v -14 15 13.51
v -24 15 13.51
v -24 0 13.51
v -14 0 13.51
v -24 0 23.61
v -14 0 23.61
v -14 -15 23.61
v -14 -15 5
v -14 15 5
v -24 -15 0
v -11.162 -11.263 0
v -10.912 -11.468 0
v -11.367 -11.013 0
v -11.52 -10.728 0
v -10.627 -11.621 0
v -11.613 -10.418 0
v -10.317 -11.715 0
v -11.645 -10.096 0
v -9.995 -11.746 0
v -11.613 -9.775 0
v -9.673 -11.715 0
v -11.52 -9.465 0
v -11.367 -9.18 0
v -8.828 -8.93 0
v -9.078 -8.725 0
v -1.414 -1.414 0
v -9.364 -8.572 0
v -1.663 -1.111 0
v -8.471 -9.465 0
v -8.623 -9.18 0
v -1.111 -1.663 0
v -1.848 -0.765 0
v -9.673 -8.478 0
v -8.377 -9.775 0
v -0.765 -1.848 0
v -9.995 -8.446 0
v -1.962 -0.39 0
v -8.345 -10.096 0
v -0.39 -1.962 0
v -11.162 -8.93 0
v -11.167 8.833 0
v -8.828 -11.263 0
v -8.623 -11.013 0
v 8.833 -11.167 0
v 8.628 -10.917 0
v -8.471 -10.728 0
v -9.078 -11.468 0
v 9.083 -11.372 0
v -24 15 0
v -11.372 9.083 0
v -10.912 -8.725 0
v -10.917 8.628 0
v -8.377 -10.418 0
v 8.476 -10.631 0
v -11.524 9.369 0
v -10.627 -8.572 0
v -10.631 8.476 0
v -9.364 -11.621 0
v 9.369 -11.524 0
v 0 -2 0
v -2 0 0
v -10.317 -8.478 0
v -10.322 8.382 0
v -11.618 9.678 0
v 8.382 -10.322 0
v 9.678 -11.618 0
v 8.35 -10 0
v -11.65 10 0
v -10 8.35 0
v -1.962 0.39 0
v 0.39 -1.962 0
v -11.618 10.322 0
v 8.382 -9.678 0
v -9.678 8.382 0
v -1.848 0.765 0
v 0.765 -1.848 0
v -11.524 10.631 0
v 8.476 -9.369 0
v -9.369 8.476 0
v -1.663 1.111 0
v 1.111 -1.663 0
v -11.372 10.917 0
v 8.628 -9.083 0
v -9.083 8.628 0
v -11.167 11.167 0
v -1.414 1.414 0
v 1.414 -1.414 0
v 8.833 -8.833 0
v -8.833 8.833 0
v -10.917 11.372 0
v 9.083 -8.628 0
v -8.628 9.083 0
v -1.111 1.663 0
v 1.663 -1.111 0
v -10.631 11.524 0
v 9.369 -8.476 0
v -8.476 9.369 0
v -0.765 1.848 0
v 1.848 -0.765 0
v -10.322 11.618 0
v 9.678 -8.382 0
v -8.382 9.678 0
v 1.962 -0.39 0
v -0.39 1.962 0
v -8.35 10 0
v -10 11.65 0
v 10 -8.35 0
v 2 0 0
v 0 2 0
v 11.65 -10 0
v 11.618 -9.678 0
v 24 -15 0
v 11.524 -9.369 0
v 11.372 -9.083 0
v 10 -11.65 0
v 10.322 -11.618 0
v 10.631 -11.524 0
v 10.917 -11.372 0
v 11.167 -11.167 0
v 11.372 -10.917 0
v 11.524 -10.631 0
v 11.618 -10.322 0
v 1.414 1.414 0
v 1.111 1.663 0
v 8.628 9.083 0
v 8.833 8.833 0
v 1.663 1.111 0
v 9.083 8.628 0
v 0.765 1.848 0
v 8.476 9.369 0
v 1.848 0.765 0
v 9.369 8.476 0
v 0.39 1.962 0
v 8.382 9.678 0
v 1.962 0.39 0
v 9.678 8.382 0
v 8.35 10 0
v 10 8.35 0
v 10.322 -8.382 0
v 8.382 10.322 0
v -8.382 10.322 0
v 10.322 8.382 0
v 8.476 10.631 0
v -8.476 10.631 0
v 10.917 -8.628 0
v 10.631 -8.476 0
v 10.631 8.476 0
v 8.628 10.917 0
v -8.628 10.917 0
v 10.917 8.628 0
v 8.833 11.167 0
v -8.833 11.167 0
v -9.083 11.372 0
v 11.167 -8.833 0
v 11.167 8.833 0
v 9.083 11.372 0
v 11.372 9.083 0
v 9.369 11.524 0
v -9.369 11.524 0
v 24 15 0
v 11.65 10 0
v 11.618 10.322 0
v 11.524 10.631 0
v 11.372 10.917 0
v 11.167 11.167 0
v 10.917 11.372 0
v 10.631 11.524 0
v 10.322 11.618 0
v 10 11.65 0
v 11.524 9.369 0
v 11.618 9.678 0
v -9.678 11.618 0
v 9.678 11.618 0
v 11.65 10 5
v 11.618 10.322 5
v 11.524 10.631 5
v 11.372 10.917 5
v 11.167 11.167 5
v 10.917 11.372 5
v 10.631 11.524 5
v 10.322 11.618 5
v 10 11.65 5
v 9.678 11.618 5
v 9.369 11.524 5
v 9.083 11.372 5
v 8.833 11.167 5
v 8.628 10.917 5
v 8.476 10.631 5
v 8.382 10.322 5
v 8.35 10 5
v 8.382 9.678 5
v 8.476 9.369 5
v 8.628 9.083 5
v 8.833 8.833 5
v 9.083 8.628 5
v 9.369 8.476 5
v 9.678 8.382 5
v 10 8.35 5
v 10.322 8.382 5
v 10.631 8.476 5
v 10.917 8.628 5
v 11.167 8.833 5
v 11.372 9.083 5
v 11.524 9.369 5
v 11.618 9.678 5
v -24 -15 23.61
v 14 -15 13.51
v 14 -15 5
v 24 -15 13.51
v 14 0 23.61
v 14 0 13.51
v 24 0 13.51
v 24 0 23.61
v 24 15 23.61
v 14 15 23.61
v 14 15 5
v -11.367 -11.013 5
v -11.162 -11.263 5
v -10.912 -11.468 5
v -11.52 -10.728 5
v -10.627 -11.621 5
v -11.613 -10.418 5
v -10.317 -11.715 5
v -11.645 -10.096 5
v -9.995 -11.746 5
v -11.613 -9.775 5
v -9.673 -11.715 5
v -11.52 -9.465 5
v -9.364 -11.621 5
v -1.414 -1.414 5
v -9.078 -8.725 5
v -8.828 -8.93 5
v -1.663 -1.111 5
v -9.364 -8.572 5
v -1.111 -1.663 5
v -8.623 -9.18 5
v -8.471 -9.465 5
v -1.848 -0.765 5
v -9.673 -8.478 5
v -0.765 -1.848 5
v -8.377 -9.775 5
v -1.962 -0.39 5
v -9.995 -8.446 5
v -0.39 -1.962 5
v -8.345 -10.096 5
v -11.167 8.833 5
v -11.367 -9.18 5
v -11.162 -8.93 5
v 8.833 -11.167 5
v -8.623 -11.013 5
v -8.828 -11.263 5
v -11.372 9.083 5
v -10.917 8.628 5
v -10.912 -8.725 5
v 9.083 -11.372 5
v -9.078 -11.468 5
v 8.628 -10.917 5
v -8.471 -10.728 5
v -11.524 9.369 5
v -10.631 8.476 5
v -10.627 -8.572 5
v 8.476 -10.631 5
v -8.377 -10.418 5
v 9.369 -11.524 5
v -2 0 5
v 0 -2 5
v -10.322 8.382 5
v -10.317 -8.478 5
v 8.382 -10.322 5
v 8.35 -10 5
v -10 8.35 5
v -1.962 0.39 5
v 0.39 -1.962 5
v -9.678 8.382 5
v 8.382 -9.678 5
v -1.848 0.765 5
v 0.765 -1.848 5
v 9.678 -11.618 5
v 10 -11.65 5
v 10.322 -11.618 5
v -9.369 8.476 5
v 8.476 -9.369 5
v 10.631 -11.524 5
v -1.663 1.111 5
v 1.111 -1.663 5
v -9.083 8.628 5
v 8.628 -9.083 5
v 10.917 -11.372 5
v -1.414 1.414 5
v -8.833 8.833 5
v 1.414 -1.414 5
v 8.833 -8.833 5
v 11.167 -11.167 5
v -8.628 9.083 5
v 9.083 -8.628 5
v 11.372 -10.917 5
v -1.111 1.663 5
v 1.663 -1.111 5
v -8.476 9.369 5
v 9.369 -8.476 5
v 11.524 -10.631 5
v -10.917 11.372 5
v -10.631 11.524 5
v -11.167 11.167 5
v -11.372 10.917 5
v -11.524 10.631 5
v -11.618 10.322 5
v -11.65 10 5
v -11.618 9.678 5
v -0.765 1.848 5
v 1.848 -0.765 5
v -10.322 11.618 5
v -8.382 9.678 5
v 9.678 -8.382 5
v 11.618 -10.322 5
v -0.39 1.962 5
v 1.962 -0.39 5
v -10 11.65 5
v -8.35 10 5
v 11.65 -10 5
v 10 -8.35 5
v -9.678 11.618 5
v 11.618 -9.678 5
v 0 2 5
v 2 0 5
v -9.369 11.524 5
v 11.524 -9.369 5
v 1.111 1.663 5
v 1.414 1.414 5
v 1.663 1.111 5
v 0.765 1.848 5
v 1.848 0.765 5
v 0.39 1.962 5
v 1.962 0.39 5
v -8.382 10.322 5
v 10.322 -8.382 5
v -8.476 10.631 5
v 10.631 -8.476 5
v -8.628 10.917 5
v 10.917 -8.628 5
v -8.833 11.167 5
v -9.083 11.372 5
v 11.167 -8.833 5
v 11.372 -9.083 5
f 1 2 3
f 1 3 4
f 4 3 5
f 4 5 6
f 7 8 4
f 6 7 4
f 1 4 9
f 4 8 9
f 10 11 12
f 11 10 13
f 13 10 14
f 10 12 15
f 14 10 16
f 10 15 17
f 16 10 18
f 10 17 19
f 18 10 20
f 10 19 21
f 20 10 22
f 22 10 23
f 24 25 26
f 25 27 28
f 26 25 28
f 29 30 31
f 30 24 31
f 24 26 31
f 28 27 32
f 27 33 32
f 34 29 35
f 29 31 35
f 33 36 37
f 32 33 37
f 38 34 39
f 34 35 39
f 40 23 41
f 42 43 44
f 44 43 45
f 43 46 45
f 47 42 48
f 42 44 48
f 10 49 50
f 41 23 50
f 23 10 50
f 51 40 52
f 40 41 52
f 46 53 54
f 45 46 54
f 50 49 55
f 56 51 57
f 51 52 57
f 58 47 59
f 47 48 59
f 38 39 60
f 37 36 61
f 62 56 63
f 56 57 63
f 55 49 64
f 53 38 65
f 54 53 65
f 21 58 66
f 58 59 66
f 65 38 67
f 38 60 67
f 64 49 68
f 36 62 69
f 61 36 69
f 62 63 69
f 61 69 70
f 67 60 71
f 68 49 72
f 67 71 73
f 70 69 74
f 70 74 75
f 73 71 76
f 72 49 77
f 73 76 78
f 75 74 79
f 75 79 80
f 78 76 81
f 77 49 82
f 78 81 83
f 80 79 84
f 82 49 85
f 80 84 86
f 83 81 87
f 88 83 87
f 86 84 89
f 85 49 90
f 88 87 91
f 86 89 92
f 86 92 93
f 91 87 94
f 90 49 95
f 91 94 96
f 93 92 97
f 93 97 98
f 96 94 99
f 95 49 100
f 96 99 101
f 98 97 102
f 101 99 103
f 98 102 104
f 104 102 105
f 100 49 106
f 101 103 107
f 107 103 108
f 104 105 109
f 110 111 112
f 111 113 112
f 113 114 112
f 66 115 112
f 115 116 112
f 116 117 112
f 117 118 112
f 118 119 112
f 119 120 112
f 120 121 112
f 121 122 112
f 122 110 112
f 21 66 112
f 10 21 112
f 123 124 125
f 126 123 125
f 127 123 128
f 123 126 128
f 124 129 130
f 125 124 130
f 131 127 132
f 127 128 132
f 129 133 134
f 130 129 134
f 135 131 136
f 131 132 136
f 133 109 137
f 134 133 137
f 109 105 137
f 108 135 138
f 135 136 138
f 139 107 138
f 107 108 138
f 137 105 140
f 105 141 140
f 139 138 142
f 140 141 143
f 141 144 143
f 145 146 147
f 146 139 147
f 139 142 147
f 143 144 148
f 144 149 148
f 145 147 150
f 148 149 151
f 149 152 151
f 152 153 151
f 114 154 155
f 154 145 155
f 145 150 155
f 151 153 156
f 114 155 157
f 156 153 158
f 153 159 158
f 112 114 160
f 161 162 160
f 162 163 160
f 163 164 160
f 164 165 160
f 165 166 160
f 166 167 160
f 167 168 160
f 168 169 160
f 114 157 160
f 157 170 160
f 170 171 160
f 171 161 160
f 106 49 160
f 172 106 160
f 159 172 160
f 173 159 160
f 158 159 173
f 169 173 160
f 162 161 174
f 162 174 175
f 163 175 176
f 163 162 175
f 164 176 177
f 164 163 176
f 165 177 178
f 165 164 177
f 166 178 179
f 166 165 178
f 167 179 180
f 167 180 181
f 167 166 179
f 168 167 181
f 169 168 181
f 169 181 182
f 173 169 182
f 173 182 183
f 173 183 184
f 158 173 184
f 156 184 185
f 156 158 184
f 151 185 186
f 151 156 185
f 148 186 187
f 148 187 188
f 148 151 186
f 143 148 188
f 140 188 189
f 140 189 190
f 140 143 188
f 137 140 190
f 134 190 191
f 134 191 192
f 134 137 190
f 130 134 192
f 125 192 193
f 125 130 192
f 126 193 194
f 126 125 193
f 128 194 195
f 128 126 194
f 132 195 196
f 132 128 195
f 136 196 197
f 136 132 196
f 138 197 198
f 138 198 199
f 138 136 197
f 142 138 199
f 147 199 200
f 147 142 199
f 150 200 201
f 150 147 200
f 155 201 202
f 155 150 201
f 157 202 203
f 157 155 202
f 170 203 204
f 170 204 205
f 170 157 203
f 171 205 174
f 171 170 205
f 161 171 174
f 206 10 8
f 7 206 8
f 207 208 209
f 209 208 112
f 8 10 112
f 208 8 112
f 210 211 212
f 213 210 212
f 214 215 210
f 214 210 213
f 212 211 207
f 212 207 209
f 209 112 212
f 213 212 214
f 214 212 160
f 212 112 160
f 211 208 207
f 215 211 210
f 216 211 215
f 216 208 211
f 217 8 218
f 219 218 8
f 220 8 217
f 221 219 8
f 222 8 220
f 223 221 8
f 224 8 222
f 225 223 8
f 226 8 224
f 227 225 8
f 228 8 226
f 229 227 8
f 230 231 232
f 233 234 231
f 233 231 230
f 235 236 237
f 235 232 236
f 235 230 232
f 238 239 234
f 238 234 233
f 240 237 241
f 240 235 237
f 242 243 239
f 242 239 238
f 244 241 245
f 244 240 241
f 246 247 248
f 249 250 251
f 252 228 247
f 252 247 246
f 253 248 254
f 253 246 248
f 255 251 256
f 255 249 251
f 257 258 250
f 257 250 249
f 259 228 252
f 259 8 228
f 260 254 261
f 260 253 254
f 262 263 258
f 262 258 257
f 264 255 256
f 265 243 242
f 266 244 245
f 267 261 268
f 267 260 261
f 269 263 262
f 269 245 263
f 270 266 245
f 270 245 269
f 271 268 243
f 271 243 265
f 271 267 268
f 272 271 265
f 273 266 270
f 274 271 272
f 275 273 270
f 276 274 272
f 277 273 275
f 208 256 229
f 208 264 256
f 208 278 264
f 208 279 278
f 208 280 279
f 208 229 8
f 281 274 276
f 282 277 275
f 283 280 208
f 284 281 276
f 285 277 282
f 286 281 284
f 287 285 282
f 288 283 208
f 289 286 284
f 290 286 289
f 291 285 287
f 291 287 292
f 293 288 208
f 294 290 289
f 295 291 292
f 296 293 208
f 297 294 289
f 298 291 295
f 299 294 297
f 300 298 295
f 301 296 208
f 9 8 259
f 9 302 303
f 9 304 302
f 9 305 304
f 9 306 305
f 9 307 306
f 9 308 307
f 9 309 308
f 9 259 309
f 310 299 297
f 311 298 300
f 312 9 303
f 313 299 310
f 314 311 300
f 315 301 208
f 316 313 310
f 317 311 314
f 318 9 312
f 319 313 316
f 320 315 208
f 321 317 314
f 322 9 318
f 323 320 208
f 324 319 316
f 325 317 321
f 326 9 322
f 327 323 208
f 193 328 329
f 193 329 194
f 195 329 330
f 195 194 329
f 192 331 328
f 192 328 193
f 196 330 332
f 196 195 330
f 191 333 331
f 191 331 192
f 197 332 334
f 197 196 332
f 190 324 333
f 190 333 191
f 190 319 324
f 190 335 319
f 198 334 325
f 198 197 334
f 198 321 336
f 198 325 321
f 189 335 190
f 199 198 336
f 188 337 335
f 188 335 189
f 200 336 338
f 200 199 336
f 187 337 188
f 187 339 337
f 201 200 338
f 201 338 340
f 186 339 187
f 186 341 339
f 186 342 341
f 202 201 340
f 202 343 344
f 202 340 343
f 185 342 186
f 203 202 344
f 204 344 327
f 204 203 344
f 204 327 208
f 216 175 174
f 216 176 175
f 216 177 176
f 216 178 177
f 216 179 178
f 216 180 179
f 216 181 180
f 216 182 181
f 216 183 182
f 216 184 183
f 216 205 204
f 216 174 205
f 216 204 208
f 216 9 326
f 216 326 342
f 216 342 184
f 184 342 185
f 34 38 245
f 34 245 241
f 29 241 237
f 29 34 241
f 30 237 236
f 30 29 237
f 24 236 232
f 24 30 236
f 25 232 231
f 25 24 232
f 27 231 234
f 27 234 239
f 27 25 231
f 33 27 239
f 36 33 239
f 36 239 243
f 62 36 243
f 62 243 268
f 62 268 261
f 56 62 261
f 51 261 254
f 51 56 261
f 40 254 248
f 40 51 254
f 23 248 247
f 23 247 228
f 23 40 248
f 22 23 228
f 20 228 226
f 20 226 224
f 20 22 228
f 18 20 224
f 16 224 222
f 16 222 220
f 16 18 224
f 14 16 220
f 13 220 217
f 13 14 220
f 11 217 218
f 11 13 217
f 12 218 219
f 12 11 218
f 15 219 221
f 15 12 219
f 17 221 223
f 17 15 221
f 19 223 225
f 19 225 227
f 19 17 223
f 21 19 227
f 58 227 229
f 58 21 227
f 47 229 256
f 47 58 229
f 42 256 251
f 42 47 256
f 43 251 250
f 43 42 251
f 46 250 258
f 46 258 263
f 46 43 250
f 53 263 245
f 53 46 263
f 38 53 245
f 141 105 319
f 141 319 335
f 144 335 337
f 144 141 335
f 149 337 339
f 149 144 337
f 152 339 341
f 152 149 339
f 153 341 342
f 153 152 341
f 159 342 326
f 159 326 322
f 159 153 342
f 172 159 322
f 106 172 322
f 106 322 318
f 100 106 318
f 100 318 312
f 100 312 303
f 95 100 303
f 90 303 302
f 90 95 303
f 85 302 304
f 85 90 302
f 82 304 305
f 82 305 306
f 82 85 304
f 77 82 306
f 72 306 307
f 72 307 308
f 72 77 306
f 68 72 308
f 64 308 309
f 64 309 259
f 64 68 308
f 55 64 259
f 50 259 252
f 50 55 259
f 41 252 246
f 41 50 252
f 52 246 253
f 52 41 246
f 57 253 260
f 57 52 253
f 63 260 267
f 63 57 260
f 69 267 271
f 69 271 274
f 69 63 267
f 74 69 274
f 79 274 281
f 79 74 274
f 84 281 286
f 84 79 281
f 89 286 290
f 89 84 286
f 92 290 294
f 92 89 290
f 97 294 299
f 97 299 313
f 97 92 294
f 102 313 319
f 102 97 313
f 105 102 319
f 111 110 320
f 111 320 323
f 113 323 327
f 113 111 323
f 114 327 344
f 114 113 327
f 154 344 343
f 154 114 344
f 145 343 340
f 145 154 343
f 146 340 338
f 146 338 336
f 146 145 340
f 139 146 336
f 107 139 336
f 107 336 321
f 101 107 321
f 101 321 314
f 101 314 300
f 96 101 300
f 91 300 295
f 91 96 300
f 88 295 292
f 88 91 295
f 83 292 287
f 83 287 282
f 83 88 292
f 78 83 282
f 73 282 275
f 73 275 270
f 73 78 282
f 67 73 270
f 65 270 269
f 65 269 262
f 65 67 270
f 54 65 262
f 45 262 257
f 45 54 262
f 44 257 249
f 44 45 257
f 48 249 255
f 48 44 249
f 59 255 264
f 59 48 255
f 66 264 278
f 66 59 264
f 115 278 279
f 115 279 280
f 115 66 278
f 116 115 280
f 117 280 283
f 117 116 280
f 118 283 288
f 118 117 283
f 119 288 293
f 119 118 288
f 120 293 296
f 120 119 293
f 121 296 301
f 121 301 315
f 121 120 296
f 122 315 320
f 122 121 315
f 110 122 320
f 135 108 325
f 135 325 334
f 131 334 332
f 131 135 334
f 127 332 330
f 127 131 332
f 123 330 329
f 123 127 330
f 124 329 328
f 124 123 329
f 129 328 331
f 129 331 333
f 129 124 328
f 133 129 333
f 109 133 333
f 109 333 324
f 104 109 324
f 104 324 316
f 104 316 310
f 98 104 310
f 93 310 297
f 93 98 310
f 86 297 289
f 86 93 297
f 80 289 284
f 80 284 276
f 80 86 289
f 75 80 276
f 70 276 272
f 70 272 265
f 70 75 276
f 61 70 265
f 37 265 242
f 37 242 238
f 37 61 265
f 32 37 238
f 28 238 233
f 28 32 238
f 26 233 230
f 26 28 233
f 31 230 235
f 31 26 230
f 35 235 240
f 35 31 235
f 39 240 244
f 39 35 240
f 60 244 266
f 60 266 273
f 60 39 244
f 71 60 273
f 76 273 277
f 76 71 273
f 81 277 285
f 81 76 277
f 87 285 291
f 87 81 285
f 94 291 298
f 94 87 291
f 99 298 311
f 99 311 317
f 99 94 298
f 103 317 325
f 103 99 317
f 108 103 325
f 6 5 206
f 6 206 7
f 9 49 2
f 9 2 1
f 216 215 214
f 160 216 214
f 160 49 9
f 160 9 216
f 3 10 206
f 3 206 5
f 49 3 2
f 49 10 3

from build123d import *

# Parameters (mm, degrees)
SKETCH1_W           = 48
SKETCH1_H           = 30
SKETCH1_R           = 1.65
SKETCH1_R_2         = 2
BOSS_EXTRUDE1_DEPTH = 5
SKETCH2_W           = 10
SKETCH2_H           = 15
BOSS_EXTRUDE2_DEPTH = 18.61
SKETCH2_3_W         = 10
SKETCH2_3_H         = 15
BOSS_EXTRUDE3_DEPTH = 8.51


with BuildPart() as part:
    # Sketch1 → Boss-Extrude1 (new body)
    with BuildSketch(Plane.XY):
        Rectangle(SKETCH1_W, SKETCH1_H)
        with Locations((-10, 10)):
            Circle(SKETCH1_R, mode=Mode.SUBTRACT)
        with Locations((10, 10)):
            Circle(SKETCH1_R, mode=Mode.SUBTRACT)
        with Locations((10, -10)):
            Circle(SKETCH1_R, mode=Mode.SUBTRACT)
        with Locations((-9.995165444, -10.096450463)):
            Circle(SKETCH1_R, mode=Mode.SUBTRACT)
        Circle(SKETCH1_R_2, mode=Mode.SUBTRACT)
    extrude(amount=BOSS_EXTRUDE1_DEPTH)

    # Sketch2 → Boss-Extrude2 (add)
    with BuildSketch(Plane.XY.offset(5)):
        with Locations((19, 7.5)):
            Rectangle(SKETCH2_W, SKETCH2_H)
        with Locations((-19, -7.5)):
            Rectangle(SKETCH2_W, SKETCH2_H)
    extrude(amount=BOSS_EXTRUDE2_DEPTH)

    # Sketch2<3> → Boss-Extrude3 (add)
    with BuildSketch(Plane.XY.offset(5)):
        with Locations((19, -7.5)):
            Rectangle(SKETCH2_3_W, SKETCH2_3_H)
        with Locations((-19, 7.5)):
            Rectangle(SKETCH2_3_W, SKETCH2_3_H)
    extrude(amount=BOSS_EXTRUDE3_DEPTH)


solid = part.part
